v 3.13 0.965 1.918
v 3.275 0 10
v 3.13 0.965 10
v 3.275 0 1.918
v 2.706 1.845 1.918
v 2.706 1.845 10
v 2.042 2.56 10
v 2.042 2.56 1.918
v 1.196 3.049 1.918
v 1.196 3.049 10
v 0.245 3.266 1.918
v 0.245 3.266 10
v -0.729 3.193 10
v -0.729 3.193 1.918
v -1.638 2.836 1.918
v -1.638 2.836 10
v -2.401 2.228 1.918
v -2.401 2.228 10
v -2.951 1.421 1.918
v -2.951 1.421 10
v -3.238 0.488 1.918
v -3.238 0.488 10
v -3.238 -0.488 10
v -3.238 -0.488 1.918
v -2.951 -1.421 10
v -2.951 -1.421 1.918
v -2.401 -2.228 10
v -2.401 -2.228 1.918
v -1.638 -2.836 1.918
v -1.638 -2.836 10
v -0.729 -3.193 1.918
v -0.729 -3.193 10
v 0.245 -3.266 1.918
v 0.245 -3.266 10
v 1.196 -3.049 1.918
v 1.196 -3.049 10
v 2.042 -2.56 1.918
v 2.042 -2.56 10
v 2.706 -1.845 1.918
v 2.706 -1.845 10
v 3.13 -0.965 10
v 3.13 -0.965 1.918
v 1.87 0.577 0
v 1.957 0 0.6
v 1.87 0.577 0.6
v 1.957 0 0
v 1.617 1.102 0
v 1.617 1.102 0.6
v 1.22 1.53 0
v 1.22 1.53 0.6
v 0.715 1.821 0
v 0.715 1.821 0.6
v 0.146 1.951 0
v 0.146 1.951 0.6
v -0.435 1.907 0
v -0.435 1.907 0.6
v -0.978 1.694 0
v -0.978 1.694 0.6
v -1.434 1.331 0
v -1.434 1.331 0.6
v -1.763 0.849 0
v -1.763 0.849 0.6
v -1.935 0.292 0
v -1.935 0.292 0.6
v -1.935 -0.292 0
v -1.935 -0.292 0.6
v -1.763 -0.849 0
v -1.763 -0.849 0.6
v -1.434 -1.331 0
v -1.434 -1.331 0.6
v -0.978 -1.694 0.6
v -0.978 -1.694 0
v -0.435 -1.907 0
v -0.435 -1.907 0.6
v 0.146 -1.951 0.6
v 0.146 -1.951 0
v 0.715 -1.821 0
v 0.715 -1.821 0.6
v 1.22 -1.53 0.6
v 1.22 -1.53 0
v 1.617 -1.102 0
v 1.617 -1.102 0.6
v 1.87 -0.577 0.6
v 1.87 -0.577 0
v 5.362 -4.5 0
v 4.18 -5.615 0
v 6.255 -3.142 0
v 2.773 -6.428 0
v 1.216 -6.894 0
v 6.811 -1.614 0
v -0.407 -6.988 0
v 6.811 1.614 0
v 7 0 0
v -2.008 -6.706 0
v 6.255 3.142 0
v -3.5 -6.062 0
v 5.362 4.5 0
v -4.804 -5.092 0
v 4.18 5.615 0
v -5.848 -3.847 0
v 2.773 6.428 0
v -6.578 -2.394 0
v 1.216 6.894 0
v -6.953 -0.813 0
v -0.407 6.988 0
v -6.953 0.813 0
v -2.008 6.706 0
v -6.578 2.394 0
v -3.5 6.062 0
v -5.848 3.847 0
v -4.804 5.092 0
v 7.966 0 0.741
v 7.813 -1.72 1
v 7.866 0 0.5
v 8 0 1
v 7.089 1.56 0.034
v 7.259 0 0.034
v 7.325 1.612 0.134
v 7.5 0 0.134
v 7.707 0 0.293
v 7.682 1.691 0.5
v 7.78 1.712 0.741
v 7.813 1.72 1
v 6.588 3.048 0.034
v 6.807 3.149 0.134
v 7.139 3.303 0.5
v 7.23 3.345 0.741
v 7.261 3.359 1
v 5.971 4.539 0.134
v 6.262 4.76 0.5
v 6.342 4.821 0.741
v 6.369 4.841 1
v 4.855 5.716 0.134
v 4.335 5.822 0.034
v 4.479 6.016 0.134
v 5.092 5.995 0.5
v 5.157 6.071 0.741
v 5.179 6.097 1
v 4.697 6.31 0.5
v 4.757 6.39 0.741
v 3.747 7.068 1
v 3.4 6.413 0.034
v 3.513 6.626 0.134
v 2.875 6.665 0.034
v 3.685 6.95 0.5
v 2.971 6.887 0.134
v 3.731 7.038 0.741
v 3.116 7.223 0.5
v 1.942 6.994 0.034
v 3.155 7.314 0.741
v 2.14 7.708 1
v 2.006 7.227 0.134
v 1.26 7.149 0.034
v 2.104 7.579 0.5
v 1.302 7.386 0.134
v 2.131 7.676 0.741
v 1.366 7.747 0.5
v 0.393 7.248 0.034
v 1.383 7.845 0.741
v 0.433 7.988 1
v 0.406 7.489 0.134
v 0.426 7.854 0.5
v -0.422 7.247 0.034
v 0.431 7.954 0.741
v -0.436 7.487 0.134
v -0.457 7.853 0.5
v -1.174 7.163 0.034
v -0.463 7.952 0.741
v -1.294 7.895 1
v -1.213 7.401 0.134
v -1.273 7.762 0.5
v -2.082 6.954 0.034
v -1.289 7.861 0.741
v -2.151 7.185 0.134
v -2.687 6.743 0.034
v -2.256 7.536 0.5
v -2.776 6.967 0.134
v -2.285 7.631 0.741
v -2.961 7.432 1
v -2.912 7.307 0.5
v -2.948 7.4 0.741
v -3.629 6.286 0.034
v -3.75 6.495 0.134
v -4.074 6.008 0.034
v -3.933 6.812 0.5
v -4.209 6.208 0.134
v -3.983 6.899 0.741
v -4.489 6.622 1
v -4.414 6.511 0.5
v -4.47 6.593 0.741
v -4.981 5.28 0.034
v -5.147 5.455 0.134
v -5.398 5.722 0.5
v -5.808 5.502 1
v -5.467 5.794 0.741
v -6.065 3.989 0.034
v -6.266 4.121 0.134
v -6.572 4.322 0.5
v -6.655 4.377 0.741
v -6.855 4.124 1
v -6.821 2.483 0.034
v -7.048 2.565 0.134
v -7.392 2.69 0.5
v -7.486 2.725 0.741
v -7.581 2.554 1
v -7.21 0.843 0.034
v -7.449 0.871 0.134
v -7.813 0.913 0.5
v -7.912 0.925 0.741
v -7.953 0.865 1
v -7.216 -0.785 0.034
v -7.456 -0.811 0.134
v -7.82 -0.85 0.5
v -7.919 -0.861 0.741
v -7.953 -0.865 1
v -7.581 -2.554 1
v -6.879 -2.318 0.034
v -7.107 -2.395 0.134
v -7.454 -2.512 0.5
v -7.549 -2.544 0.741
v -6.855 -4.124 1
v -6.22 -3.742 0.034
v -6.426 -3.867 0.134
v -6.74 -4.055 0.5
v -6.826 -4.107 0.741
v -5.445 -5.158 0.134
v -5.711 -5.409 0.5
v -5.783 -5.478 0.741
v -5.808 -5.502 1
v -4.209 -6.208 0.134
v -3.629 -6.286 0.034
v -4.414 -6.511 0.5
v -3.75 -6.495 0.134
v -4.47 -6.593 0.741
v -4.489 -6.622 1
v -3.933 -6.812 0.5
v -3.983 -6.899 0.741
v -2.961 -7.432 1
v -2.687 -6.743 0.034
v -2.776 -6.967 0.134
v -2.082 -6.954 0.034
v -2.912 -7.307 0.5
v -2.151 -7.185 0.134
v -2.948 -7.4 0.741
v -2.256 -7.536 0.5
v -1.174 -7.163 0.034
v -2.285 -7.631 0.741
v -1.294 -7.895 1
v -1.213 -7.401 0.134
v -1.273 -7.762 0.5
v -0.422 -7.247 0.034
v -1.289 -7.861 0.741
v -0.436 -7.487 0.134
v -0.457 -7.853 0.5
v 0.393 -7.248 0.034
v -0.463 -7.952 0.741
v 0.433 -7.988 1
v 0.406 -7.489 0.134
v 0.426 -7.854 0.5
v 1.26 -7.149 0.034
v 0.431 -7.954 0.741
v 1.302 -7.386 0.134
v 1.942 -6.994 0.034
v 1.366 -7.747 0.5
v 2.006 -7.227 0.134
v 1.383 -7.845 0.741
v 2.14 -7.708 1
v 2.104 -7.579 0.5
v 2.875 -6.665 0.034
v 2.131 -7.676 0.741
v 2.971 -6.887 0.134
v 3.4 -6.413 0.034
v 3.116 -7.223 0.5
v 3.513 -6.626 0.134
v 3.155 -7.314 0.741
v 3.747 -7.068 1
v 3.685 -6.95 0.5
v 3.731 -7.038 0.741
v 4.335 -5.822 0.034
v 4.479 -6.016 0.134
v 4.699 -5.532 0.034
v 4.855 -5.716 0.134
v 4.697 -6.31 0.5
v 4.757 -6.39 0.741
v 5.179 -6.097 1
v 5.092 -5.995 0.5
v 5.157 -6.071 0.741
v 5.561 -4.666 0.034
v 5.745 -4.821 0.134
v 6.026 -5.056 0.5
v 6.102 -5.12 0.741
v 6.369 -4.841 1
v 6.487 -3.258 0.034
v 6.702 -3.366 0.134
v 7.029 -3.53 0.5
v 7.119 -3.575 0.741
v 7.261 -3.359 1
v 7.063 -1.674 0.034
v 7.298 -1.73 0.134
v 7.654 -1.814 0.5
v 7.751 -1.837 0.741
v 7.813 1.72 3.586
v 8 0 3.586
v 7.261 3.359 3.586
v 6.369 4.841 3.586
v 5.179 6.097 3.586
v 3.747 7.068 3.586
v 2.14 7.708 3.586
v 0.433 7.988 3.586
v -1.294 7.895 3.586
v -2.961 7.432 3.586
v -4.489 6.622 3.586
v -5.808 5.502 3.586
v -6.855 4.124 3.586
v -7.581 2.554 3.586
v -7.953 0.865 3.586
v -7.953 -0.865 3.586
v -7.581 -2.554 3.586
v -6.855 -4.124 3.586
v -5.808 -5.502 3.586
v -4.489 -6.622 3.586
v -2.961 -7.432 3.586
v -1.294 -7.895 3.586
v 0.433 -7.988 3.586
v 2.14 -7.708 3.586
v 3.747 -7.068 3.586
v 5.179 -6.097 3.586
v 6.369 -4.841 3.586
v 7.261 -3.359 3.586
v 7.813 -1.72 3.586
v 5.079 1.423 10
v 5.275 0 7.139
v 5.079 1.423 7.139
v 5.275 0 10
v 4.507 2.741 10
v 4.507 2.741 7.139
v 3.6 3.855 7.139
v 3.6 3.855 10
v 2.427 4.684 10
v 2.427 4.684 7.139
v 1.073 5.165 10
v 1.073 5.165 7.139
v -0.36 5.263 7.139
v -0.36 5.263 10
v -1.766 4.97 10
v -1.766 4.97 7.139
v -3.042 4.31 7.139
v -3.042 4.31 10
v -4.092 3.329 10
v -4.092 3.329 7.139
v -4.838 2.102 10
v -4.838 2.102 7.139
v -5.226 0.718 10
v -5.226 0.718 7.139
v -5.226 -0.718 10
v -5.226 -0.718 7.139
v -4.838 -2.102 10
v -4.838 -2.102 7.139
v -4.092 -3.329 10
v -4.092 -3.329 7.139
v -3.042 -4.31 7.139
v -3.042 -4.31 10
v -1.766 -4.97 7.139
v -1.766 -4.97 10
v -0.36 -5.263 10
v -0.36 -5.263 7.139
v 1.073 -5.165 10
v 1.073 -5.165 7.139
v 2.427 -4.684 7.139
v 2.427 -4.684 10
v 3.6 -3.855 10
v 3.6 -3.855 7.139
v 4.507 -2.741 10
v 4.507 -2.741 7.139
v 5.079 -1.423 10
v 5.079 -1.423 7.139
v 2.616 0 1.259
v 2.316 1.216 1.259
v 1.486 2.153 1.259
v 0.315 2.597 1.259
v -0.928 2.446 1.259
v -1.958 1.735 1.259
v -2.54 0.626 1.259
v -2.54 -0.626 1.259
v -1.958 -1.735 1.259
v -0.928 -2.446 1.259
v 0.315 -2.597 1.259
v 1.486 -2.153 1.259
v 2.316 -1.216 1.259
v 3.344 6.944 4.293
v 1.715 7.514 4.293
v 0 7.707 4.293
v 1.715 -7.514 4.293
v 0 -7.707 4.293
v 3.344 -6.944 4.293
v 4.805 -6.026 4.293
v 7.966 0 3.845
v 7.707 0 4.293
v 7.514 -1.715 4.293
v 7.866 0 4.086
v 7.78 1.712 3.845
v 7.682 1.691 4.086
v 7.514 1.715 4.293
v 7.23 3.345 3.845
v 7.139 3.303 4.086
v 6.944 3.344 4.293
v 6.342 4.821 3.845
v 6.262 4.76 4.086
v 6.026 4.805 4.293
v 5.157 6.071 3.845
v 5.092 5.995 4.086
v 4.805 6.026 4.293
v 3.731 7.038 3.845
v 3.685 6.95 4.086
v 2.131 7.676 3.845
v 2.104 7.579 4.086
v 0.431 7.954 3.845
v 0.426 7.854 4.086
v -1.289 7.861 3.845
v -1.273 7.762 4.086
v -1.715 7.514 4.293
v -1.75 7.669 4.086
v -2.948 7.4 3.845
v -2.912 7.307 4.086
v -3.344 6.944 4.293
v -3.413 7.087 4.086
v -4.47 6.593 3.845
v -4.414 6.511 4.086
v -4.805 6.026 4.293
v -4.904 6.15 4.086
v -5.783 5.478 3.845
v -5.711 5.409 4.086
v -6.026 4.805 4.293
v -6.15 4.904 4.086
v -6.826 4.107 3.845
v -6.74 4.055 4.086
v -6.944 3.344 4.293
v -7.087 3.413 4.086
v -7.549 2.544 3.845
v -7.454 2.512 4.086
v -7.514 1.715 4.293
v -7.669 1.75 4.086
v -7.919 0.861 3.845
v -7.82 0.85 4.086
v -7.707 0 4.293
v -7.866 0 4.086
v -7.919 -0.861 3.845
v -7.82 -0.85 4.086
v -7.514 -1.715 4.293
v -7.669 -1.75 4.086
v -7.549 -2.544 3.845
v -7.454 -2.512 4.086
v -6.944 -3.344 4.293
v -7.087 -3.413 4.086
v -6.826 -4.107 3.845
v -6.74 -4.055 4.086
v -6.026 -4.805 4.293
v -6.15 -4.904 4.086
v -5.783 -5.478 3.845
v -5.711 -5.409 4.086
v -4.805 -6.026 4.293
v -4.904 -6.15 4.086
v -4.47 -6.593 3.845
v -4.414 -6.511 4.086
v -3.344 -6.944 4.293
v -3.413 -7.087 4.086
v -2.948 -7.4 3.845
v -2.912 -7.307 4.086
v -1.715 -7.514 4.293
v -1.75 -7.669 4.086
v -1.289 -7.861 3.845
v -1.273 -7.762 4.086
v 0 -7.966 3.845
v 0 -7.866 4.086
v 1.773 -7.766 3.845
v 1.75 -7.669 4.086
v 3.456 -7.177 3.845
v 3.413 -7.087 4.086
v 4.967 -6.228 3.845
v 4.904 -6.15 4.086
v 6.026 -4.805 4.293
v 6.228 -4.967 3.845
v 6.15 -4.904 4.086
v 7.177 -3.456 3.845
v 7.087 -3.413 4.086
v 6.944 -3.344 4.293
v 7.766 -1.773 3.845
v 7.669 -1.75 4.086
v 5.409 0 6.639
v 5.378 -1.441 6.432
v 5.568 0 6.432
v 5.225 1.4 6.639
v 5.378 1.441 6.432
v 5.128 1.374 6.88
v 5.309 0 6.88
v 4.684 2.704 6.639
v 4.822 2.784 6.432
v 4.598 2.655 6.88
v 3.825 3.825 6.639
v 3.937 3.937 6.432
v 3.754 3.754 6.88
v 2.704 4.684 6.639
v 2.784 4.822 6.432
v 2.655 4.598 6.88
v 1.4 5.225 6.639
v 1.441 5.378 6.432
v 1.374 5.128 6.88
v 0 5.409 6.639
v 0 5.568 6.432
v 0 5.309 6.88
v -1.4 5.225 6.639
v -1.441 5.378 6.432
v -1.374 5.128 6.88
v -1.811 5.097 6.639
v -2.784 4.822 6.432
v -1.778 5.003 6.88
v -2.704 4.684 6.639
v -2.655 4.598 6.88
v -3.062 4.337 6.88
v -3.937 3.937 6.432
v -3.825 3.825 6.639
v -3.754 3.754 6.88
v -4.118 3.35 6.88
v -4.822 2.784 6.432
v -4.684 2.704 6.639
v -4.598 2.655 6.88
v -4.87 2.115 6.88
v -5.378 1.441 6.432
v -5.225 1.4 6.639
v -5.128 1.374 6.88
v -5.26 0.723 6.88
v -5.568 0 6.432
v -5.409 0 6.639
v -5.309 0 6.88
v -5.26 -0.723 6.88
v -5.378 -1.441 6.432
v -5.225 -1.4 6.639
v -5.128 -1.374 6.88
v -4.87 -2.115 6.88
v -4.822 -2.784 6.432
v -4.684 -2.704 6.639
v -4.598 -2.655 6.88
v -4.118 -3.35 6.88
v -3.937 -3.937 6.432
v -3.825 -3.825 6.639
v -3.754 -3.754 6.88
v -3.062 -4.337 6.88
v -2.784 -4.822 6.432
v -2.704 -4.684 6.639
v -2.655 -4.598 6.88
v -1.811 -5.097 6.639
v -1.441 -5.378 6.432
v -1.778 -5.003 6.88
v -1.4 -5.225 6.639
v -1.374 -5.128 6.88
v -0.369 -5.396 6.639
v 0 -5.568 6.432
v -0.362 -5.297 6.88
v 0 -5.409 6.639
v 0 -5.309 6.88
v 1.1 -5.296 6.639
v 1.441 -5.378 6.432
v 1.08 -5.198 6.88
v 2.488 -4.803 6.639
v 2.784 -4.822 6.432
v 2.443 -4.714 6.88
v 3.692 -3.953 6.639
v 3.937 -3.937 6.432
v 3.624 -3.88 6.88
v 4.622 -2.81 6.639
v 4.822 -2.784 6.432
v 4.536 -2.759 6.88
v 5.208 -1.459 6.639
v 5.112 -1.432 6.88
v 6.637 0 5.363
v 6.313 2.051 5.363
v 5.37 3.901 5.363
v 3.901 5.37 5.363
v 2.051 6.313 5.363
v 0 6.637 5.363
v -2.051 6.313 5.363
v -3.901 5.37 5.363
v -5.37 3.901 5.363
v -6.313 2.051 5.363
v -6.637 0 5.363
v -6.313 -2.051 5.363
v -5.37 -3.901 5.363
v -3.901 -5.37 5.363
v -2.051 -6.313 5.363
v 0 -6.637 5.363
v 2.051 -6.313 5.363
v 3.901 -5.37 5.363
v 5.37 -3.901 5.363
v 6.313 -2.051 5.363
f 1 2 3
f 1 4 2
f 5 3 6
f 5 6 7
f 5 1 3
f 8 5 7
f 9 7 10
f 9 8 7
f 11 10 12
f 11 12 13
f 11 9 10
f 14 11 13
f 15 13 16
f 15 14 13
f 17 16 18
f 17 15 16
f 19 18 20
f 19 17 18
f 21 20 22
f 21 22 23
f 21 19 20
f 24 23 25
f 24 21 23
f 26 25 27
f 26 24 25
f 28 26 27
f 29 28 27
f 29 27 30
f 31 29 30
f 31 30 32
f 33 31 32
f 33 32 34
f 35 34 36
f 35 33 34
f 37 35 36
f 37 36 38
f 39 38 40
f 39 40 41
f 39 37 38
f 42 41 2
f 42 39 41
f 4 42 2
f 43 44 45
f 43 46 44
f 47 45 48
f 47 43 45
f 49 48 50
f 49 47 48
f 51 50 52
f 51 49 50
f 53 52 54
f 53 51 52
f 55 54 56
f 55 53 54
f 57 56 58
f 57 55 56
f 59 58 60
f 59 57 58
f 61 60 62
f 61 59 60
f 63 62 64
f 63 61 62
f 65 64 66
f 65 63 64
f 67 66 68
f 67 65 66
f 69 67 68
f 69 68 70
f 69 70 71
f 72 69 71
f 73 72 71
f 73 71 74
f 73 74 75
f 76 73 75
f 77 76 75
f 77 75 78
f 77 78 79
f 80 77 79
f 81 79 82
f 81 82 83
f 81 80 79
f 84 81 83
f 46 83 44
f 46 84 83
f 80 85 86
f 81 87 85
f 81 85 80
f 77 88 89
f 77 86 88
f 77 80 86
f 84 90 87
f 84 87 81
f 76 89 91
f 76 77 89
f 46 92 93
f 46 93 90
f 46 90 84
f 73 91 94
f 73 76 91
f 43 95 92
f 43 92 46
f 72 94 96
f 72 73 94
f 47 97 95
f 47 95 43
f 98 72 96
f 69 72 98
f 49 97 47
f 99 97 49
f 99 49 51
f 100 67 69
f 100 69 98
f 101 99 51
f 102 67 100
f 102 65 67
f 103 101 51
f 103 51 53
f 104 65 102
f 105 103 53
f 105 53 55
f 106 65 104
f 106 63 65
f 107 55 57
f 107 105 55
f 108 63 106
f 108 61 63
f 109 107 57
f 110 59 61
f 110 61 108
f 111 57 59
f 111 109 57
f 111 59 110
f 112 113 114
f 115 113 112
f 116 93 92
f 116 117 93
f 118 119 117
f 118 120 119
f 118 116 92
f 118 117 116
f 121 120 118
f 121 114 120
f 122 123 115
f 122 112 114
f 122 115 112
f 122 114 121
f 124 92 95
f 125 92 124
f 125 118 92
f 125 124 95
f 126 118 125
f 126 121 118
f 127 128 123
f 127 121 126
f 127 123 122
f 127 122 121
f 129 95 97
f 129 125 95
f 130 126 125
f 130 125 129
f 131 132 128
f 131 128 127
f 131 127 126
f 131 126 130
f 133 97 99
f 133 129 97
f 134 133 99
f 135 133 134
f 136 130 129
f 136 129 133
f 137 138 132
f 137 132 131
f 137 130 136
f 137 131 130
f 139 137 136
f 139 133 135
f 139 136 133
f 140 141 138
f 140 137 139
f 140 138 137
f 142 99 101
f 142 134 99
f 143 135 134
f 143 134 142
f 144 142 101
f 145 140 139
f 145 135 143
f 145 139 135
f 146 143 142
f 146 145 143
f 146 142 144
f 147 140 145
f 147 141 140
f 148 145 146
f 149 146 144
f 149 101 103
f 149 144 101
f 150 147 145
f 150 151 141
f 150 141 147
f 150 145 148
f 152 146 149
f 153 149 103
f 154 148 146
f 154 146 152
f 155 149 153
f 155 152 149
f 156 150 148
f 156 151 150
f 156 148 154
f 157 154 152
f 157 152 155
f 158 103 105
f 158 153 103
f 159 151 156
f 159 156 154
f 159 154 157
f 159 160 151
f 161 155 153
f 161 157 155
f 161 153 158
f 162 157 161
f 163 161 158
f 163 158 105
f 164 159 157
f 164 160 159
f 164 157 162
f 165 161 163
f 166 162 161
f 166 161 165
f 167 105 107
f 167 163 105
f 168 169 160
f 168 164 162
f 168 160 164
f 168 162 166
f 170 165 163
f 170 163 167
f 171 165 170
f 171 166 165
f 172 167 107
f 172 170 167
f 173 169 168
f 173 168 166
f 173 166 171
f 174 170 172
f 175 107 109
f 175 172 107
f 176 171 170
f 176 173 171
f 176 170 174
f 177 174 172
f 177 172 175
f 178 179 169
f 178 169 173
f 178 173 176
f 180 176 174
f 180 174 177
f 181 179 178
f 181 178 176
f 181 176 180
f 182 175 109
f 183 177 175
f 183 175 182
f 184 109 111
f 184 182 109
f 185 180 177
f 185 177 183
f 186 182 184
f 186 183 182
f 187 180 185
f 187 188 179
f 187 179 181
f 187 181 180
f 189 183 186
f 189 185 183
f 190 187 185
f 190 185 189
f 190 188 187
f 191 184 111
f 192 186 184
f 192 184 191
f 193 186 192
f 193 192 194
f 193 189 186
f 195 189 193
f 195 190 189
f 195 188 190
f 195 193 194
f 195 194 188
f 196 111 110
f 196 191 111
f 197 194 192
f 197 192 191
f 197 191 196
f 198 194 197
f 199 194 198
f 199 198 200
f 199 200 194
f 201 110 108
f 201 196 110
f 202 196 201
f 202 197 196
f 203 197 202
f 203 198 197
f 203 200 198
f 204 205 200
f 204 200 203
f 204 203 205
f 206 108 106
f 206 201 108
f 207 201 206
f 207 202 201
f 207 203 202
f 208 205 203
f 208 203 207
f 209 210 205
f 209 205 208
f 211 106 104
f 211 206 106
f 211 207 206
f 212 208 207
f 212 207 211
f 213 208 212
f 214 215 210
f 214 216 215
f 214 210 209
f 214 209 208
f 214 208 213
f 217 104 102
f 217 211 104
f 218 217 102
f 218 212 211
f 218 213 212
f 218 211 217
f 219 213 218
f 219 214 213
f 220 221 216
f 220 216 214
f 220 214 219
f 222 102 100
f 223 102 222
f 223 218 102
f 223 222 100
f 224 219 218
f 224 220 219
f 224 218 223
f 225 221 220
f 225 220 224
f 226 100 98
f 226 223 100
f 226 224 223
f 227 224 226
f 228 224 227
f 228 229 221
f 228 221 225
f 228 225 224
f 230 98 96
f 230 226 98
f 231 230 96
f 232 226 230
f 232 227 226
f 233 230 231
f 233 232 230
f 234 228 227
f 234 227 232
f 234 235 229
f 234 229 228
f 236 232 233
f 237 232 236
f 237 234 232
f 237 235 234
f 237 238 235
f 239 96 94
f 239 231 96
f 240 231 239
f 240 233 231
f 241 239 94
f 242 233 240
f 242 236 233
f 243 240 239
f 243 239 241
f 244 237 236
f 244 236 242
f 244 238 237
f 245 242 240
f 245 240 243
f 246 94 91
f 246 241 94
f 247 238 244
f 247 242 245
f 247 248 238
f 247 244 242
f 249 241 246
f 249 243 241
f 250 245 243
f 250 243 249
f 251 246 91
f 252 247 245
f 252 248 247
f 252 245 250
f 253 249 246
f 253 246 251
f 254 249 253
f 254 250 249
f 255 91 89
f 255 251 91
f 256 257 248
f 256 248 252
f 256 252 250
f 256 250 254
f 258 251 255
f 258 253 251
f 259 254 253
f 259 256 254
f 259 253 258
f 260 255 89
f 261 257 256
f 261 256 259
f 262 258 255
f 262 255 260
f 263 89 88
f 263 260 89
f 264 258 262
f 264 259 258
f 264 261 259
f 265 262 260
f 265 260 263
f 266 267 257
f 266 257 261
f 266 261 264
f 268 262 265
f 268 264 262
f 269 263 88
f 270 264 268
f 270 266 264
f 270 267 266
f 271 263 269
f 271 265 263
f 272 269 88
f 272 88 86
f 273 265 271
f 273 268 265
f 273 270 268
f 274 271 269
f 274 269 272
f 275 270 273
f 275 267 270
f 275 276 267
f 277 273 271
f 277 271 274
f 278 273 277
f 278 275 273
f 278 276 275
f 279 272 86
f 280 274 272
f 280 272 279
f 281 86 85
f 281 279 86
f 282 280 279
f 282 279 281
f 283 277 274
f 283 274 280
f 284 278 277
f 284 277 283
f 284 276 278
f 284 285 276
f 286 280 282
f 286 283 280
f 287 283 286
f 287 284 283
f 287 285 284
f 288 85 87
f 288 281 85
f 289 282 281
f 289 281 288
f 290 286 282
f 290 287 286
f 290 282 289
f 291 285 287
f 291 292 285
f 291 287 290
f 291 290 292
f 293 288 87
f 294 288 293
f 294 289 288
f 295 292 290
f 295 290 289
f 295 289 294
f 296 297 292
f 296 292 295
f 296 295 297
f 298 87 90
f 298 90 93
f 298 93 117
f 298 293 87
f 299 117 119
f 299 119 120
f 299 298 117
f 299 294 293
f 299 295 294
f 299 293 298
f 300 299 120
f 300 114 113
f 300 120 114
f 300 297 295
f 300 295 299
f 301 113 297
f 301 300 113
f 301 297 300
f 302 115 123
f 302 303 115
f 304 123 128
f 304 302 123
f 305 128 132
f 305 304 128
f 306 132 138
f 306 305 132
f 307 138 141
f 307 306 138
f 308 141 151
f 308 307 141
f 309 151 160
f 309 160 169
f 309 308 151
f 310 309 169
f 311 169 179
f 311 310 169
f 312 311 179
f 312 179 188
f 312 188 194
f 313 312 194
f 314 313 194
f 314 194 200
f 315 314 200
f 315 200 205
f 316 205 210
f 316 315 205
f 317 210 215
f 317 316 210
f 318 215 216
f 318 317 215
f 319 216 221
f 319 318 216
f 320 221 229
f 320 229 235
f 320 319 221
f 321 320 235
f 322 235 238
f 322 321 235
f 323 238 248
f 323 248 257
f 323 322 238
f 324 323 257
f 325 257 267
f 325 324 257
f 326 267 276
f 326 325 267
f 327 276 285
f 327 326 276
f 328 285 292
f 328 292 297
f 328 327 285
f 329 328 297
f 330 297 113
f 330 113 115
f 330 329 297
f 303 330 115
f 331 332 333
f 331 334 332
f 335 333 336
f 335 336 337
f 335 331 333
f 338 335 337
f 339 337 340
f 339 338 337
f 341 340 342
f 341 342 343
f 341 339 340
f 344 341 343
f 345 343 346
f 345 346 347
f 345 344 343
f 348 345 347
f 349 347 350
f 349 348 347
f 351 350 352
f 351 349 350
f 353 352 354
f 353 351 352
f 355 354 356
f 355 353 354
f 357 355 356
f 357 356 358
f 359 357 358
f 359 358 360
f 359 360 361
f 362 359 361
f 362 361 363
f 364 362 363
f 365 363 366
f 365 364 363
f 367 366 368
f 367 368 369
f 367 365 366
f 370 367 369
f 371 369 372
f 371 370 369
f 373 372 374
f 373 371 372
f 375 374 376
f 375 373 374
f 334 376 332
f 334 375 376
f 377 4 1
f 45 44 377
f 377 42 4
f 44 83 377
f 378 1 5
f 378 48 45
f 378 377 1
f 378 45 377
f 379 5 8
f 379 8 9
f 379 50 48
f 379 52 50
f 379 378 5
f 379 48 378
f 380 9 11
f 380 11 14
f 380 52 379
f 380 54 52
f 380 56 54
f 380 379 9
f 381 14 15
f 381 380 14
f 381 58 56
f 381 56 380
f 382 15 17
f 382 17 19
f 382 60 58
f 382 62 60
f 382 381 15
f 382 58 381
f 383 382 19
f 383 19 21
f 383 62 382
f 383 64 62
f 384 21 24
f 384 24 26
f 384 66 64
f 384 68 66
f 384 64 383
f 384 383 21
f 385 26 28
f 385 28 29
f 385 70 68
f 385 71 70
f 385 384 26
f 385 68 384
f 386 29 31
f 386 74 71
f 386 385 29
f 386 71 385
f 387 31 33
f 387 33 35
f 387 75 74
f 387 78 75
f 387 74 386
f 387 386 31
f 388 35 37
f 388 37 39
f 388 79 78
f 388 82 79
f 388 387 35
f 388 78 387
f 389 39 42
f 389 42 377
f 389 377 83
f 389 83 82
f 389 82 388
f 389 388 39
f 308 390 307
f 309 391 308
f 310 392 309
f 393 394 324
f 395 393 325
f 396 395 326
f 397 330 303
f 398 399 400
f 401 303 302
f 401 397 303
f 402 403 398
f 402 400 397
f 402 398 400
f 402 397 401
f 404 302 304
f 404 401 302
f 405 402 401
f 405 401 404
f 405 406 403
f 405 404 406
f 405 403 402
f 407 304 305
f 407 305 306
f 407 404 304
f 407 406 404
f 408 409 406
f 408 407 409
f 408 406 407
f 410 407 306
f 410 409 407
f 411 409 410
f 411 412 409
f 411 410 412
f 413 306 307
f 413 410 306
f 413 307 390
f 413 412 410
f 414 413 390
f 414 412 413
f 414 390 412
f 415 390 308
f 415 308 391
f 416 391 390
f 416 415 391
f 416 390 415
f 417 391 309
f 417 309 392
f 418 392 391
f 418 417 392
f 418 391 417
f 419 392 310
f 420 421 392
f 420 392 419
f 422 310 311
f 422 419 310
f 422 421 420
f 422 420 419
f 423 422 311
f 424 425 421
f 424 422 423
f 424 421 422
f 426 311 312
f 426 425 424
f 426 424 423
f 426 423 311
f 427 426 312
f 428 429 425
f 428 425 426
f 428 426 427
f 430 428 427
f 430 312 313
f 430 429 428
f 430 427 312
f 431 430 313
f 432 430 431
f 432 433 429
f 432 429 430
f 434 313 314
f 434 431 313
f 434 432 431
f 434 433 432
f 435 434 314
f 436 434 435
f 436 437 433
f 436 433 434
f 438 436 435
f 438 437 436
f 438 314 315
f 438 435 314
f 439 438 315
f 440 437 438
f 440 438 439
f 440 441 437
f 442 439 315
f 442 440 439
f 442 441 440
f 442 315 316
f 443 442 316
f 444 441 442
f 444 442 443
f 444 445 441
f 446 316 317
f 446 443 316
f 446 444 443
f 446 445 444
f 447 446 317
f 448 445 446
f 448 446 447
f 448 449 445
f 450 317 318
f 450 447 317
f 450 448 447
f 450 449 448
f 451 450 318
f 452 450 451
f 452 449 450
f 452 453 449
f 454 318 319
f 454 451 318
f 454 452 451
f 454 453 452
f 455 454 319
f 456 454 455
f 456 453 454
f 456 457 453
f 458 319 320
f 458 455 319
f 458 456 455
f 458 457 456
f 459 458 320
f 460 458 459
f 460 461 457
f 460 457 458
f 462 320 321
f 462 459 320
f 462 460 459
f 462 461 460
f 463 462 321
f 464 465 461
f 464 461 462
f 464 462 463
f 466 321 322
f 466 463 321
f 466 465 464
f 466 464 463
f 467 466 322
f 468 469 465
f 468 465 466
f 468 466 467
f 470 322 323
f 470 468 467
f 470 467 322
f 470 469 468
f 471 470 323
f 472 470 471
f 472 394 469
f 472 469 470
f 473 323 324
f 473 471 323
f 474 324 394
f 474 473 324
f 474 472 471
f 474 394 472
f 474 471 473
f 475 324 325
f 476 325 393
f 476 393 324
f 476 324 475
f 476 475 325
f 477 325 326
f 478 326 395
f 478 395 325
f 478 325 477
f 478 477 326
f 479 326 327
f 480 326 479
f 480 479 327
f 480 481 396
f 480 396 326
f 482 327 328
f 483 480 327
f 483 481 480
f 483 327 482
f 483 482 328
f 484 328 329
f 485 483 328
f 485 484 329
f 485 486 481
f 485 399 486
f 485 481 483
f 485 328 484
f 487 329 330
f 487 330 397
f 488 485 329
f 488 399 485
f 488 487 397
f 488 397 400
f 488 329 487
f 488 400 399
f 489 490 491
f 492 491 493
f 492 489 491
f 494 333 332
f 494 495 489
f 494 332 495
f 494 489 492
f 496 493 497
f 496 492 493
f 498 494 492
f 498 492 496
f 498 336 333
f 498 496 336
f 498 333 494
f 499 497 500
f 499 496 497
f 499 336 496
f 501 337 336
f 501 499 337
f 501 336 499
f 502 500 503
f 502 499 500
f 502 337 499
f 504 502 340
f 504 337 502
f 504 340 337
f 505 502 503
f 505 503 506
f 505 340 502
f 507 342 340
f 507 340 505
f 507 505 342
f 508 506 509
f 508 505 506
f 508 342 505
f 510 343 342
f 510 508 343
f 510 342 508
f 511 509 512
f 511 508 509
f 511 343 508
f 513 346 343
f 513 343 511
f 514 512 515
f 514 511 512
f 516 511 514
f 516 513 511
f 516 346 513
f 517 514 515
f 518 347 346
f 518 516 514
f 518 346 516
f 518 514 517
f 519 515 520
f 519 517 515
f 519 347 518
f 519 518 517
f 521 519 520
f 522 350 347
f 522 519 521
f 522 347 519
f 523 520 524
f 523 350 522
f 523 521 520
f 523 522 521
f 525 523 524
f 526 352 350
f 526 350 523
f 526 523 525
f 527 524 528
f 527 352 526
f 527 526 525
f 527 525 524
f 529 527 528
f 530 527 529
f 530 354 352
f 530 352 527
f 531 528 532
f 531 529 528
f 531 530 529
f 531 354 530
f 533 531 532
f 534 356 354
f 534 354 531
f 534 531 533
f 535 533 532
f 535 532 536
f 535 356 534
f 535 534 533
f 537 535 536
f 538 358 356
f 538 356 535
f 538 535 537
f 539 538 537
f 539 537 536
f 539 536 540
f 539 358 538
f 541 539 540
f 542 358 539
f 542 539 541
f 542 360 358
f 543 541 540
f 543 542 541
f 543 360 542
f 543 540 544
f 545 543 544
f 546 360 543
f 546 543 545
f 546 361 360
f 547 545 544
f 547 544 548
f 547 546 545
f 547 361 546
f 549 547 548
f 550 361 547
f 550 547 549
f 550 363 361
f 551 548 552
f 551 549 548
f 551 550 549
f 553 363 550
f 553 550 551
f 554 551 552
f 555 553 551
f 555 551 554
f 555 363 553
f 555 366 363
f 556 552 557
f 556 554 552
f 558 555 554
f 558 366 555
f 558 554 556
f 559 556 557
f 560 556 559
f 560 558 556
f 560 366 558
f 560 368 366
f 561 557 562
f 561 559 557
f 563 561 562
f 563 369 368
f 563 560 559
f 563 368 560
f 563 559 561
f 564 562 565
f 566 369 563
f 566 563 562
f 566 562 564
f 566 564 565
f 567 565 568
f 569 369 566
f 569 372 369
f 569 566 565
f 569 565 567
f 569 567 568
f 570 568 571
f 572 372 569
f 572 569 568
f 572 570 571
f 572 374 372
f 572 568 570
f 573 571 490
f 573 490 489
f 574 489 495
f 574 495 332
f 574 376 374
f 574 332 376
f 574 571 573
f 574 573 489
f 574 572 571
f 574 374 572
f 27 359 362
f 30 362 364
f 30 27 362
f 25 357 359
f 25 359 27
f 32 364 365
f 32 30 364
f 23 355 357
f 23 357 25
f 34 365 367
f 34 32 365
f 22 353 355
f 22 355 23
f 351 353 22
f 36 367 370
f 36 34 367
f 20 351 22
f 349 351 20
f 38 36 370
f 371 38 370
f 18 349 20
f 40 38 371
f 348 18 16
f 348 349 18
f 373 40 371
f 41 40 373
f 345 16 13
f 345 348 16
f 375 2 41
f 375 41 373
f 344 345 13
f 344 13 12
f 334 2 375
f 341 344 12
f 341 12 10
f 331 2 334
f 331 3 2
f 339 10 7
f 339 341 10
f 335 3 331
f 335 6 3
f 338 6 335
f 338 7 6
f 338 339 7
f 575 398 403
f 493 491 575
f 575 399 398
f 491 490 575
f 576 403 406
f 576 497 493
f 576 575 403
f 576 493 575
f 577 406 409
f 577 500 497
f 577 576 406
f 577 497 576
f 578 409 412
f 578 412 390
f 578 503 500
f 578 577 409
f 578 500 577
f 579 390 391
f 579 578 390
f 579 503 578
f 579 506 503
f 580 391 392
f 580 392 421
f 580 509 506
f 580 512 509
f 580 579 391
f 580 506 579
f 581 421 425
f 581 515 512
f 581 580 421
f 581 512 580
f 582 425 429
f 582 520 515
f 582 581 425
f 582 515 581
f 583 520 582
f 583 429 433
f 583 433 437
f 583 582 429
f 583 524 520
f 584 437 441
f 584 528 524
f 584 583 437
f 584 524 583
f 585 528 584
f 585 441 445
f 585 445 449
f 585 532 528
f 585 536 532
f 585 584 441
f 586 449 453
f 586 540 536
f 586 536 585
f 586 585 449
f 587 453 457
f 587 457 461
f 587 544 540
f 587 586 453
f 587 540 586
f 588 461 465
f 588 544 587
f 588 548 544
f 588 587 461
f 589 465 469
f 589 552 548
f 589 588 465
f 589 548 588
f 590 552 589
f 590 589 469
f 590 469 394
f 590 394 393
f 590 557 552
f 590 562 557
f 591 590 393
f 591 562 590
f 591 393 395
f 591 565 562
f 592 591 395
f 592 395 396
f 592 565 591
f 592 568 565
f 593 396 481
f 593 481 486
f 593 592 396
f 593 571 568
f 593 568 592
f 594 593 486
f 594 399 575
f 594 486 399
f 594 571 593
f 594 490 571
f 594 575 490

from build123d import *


with BuildPart() as f1:
    # F0 (on Front) → F1 (revolve)
    with BuildSketch(Plane.XZ):
        with BuildLine():
            Line((1.956549, 0.6), (1.956549, 0))
            Line((1.956549, 0), (7, 0))
            ThreePointArc((7, 0), (7.707107, 0.292893), (8, 1))
            Line((8, 1), (8, 3.585786))
            ThreePointArc((8, 3.585786), (7.92388, 3.96847), (7.707107, 4.292893))
            Line((7.707107, 4.292893), (5.567893, 6.432107))
            ThreePointArc((5.567893, 6.432107), (5.35112, 6.75653), (5.275, 7.139214))
            Line((5.275, 7.139214), (5.275, 10))
            Line((5.275, 10), (3.275, 10))
            Line((3.275, 10), (3.275, 1.918451))
            Line((3.275, 1.918451), (1.956549, 0.6))
        make_face()
    revolve(axis=Axis((0, 0, 7.164844), (0, 0, 1)))


solid = f1.part
